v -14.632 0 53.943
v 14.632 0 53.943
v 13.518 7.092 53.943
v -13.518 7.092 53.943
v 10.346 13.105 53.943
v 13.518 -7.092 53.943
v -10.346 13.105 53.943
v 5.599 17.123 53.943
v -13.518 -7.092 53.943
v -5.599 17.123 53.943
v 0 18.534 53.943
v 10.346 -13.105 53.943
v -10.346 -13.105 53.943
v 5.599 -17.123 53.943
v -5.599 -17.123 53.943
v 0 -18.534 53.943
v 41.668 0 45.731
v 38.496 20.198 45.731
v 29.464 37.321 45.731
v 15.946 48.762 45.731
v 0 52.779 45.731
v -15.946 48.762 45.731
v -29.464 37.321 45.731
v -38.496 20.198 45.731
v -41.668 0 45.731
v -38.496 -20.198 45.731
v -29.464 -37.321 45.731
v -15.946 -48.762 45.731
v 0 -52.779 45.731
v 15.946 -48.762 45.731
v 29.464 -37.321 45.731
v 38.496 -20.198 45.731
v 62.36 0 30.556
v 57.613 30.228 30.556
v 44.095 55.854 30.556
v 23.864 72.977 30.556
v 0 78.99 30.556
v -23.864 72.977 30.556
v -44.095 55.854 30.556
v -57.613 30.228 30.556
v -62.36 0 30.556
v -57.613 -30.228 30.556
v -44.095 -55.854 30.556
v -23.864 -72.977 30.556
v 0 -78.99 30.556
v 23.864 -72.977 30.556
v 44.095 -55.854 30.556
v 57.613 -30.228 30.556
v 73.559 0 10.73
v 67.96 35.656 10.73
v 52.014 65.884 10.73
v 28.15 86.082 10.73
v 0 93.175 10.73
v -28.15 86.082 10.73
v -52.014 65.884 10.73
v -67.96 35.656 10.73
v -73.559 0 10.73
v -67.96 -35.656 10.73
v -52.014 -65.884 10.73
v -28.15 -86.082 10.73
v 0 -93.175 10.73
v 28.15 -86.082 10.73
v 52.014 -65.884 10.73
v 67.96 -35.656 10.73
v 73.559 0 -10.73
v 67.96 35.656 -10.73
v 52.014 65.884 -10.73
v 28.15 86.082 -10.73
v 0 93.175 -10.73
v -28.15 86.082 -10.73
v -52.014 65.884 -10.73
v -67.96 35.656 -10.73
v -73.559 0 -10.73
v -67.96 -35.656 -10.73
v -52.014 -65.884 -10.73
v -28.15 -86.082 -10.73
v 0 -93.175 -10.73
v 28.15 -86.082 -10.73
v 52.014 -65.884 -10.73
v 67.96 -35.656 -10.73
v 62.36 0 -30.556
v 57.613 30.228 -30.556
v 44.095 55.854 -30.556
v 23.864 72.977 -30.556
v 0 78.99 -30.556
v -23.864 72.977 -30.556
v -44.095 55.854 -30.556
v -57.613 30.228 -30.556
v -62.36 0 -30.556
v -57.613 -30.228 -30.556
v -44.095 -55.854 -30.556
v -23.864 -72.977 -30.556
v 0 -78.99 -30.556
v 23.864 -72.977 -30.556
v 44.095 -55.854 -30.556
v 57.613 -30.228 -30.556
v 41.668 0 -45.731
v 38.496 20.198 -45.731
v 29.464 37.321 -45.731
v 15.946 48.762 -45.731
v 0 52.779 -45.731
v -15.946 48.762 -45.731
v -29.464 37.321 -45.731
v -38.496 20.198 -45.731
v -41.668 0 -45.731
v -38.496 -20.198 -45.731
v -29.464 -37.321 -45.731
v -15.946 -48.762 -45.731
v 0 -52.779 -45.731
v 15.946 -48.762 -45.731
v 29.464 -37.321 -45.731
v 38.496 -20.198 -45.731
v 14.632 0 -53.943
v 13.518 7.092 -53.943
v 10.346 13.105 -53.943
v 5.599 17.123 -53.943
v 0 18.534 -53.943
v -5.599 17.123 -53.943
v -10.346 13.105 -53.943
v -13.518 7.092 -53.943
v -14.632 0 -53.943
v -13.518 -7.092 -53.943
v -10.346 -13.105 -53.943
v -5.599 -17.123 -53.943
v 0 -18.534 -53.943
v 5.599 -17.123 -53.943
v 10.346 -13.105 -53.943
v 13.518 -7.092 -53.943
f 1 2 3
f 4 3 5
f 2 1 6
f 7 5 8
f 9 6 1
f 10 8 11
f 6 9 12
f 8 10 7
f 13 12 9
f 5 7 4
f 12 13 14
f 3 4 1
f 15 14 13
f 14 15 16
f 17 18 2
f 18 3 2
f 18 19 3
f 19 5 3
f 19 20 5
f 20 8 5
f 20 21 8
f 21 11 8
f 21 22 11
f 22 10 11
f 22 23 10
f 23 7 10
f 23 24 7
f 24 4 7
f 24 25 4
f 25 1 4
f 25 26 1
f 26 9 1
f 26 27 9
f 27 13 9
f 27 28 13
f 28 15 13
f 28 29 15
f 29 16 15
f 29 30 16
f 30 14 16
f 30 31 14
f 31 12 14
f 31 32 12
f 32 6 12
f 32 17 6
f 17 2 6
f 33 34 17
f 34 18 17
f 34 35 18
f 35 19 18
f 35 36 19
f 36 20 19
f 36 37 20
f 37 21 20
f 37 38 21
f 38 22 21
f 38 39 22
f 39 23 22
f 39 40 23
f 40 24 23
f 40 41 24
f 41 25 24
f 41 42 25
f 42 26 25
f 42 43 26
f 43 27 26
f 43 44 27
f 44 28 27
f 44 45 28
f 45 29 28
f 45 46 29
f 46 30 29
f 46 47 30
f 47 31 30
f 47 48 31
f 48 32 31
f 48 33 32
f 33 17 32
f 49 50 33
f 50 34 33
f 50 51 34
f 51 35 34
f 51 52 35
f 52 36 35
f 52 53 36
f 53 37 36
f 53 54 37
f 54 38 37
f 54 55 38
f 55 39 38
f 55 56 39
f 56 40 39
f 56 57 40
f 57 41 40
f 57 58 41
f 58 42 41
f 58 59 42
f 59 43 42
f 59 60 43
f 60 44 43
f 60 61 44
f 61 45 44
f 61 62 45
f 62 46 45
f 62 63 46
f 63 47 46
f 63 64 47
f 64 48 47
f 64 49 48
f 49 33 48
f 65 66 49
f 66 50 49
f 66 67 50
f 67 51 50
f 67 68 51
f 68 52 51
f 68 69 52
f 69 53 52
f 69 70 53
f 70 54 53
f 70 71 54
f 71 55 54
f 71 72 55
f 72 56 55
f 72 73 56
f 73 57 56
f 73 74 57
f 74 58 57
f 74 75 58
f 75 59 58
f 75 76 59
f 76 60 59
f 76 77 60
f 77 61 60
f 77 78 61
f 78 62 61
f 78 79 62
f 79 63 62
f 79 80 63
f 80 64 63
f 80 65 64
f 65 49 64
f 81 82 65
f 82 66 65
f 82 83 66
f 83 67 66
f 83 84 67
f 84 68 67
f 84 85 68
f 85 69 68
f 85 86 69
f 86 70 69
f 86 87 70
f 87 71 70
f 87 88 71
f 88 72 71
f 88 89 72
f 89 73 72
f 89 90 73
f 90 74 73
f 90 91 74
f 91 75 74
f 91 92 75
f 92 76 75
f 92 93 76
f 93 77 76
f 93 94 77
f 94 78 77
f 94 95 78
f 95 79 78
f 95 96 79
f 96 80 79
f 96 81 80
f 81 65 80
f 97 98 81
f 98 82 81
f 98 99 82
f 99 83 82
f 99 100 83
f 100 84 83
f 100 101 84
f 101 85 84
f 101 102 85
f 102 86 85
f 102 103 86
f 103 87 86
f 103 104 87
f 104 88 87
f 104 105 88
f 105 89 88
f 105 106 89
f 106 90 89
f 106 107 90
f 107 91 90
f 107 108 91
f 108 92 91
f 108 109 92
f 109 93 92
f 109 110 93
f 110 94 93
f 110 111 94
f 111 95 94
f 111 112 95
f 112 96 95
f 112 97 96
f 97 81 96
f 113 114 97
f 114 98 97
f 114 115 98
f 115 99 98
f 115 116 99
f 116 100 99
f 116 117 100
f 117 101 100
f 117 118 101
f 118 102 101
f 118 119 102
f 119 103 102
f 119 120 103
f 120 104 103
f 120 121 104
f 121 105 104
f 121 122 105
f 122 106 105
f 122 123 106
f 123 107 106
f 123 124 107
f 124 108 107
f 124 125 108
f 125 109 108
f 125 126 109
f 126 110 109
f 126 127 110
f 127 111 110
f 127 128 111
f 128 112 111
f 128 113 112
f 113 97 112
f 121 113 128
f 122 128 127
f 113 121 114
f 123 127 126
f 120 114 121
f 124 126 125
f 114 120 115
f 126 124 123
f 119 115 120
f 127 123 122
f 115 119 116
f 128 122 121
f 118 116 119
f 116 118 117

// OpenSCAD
// Generated by SolidPython 1.0.1 on 2020-07-29 00:46:52


scale(v = [15, 19, 11]) {
	sphere(r = 5);
}
/***********************************************
*********      SolidPython code:      **********
************************************************
 
# import packages: SolidPython
from solid import *
from solid.utils import *
from itertools import chain, combinations, permutations


class Resize:

    def __init__(self, scad_file):
        self.scad_file = scad_file
        #self.scad_file = import_scad(scad_file)
        # cone/cylinder param:
        self.r1 = 0
        self.r2 = 0
        self.h = 0
        # rectangular prism param:
        self.w = 0
        self.l = 0
        # ellipse param:
        self.r = 0

    # import OpenScad code (file name corresponds to shape)


    # classify shape + parameters
    def assign(self, param1, param2, param3):
        if self.scad_file == 'cone.scad':
            self.r1 = param1
            self.r2 = param2
            self.h = param3
        elif self.scad_file == 'cylinder.scad':
            self.r1 = param1
            self.r2 = param2
            self.h = param3
        elif self.scad_file == 'rectangularPrism.scad':
            self.h = param1
            self.l = param2
            self.w = param3
        else:
            self.r = param1
            self.h = param2

    # resize parameters
    def iterate(self):
        x = range(3, 20, 2)
        i = 1
        if self.scad_file == 'cone.scad':
            tempList = list(permutations(x, 2))
            for temp in tempList:
                param1 = temp[0]
                param2 = temp[1]
                filepath = 'produced_scad_files/' + 'cone' + str(param1) + '_' + str(param2) + '_' + '.scad'
                scad_render_to_file(cylinder(h=param1, r1=param2, r2=0), filepath)

        elif self.scad_file == 'cylinder.scad':
            tempList = list(permutations(x, 3))
            for temp in tempList:
                param1 = temp[0]
                param2 = temp[1]
                filepath = 'produced_scad_files/' + 'cylinder' + str(param1) + '_' + str(param2) + '_' + '.scad'
                scad_render_to_file(cylinder(h=param1, r1=param2, r2=param2), filepath)

        elif self.scad_file == 'rectangularPrism.scad':
            tempList = list(permutations(x, 3))
            for temp in tempList:
                param1 = temp[0]
                param2 = temp[1]
                param3 = temp[2]
                filepath = 'produced_scad_files/' + 'rectangularPrism' + str(param1) + '_' + str(param2) + '_' + str(
                    param3) + '.scad'
                scad_render_to_file(cube(size=(param1, param2, param3)), filepath)

        elif self.scad_file == 'ellipse.scad':
            tempList = list(permutations(x, 4))
            for temp in tempList:
                param1 = temp[0]
                param2 = temp[1]
                param3 = temp[2]
                param4 = temp[3]
                filepath = 'produced_scad_files/' + 'ellipse' + str(param1) + '_' + str(param2) + '_' + str(param3) + '_' + str(param4) + '.scad'
                scad_render_to_file(scale([param1, param2, param3])(sphere(r=param4)), filepath)

    def render_to_scadfile(self):
        scad_render_to_file(scad, 'example.scad') 
 
************************************************/
